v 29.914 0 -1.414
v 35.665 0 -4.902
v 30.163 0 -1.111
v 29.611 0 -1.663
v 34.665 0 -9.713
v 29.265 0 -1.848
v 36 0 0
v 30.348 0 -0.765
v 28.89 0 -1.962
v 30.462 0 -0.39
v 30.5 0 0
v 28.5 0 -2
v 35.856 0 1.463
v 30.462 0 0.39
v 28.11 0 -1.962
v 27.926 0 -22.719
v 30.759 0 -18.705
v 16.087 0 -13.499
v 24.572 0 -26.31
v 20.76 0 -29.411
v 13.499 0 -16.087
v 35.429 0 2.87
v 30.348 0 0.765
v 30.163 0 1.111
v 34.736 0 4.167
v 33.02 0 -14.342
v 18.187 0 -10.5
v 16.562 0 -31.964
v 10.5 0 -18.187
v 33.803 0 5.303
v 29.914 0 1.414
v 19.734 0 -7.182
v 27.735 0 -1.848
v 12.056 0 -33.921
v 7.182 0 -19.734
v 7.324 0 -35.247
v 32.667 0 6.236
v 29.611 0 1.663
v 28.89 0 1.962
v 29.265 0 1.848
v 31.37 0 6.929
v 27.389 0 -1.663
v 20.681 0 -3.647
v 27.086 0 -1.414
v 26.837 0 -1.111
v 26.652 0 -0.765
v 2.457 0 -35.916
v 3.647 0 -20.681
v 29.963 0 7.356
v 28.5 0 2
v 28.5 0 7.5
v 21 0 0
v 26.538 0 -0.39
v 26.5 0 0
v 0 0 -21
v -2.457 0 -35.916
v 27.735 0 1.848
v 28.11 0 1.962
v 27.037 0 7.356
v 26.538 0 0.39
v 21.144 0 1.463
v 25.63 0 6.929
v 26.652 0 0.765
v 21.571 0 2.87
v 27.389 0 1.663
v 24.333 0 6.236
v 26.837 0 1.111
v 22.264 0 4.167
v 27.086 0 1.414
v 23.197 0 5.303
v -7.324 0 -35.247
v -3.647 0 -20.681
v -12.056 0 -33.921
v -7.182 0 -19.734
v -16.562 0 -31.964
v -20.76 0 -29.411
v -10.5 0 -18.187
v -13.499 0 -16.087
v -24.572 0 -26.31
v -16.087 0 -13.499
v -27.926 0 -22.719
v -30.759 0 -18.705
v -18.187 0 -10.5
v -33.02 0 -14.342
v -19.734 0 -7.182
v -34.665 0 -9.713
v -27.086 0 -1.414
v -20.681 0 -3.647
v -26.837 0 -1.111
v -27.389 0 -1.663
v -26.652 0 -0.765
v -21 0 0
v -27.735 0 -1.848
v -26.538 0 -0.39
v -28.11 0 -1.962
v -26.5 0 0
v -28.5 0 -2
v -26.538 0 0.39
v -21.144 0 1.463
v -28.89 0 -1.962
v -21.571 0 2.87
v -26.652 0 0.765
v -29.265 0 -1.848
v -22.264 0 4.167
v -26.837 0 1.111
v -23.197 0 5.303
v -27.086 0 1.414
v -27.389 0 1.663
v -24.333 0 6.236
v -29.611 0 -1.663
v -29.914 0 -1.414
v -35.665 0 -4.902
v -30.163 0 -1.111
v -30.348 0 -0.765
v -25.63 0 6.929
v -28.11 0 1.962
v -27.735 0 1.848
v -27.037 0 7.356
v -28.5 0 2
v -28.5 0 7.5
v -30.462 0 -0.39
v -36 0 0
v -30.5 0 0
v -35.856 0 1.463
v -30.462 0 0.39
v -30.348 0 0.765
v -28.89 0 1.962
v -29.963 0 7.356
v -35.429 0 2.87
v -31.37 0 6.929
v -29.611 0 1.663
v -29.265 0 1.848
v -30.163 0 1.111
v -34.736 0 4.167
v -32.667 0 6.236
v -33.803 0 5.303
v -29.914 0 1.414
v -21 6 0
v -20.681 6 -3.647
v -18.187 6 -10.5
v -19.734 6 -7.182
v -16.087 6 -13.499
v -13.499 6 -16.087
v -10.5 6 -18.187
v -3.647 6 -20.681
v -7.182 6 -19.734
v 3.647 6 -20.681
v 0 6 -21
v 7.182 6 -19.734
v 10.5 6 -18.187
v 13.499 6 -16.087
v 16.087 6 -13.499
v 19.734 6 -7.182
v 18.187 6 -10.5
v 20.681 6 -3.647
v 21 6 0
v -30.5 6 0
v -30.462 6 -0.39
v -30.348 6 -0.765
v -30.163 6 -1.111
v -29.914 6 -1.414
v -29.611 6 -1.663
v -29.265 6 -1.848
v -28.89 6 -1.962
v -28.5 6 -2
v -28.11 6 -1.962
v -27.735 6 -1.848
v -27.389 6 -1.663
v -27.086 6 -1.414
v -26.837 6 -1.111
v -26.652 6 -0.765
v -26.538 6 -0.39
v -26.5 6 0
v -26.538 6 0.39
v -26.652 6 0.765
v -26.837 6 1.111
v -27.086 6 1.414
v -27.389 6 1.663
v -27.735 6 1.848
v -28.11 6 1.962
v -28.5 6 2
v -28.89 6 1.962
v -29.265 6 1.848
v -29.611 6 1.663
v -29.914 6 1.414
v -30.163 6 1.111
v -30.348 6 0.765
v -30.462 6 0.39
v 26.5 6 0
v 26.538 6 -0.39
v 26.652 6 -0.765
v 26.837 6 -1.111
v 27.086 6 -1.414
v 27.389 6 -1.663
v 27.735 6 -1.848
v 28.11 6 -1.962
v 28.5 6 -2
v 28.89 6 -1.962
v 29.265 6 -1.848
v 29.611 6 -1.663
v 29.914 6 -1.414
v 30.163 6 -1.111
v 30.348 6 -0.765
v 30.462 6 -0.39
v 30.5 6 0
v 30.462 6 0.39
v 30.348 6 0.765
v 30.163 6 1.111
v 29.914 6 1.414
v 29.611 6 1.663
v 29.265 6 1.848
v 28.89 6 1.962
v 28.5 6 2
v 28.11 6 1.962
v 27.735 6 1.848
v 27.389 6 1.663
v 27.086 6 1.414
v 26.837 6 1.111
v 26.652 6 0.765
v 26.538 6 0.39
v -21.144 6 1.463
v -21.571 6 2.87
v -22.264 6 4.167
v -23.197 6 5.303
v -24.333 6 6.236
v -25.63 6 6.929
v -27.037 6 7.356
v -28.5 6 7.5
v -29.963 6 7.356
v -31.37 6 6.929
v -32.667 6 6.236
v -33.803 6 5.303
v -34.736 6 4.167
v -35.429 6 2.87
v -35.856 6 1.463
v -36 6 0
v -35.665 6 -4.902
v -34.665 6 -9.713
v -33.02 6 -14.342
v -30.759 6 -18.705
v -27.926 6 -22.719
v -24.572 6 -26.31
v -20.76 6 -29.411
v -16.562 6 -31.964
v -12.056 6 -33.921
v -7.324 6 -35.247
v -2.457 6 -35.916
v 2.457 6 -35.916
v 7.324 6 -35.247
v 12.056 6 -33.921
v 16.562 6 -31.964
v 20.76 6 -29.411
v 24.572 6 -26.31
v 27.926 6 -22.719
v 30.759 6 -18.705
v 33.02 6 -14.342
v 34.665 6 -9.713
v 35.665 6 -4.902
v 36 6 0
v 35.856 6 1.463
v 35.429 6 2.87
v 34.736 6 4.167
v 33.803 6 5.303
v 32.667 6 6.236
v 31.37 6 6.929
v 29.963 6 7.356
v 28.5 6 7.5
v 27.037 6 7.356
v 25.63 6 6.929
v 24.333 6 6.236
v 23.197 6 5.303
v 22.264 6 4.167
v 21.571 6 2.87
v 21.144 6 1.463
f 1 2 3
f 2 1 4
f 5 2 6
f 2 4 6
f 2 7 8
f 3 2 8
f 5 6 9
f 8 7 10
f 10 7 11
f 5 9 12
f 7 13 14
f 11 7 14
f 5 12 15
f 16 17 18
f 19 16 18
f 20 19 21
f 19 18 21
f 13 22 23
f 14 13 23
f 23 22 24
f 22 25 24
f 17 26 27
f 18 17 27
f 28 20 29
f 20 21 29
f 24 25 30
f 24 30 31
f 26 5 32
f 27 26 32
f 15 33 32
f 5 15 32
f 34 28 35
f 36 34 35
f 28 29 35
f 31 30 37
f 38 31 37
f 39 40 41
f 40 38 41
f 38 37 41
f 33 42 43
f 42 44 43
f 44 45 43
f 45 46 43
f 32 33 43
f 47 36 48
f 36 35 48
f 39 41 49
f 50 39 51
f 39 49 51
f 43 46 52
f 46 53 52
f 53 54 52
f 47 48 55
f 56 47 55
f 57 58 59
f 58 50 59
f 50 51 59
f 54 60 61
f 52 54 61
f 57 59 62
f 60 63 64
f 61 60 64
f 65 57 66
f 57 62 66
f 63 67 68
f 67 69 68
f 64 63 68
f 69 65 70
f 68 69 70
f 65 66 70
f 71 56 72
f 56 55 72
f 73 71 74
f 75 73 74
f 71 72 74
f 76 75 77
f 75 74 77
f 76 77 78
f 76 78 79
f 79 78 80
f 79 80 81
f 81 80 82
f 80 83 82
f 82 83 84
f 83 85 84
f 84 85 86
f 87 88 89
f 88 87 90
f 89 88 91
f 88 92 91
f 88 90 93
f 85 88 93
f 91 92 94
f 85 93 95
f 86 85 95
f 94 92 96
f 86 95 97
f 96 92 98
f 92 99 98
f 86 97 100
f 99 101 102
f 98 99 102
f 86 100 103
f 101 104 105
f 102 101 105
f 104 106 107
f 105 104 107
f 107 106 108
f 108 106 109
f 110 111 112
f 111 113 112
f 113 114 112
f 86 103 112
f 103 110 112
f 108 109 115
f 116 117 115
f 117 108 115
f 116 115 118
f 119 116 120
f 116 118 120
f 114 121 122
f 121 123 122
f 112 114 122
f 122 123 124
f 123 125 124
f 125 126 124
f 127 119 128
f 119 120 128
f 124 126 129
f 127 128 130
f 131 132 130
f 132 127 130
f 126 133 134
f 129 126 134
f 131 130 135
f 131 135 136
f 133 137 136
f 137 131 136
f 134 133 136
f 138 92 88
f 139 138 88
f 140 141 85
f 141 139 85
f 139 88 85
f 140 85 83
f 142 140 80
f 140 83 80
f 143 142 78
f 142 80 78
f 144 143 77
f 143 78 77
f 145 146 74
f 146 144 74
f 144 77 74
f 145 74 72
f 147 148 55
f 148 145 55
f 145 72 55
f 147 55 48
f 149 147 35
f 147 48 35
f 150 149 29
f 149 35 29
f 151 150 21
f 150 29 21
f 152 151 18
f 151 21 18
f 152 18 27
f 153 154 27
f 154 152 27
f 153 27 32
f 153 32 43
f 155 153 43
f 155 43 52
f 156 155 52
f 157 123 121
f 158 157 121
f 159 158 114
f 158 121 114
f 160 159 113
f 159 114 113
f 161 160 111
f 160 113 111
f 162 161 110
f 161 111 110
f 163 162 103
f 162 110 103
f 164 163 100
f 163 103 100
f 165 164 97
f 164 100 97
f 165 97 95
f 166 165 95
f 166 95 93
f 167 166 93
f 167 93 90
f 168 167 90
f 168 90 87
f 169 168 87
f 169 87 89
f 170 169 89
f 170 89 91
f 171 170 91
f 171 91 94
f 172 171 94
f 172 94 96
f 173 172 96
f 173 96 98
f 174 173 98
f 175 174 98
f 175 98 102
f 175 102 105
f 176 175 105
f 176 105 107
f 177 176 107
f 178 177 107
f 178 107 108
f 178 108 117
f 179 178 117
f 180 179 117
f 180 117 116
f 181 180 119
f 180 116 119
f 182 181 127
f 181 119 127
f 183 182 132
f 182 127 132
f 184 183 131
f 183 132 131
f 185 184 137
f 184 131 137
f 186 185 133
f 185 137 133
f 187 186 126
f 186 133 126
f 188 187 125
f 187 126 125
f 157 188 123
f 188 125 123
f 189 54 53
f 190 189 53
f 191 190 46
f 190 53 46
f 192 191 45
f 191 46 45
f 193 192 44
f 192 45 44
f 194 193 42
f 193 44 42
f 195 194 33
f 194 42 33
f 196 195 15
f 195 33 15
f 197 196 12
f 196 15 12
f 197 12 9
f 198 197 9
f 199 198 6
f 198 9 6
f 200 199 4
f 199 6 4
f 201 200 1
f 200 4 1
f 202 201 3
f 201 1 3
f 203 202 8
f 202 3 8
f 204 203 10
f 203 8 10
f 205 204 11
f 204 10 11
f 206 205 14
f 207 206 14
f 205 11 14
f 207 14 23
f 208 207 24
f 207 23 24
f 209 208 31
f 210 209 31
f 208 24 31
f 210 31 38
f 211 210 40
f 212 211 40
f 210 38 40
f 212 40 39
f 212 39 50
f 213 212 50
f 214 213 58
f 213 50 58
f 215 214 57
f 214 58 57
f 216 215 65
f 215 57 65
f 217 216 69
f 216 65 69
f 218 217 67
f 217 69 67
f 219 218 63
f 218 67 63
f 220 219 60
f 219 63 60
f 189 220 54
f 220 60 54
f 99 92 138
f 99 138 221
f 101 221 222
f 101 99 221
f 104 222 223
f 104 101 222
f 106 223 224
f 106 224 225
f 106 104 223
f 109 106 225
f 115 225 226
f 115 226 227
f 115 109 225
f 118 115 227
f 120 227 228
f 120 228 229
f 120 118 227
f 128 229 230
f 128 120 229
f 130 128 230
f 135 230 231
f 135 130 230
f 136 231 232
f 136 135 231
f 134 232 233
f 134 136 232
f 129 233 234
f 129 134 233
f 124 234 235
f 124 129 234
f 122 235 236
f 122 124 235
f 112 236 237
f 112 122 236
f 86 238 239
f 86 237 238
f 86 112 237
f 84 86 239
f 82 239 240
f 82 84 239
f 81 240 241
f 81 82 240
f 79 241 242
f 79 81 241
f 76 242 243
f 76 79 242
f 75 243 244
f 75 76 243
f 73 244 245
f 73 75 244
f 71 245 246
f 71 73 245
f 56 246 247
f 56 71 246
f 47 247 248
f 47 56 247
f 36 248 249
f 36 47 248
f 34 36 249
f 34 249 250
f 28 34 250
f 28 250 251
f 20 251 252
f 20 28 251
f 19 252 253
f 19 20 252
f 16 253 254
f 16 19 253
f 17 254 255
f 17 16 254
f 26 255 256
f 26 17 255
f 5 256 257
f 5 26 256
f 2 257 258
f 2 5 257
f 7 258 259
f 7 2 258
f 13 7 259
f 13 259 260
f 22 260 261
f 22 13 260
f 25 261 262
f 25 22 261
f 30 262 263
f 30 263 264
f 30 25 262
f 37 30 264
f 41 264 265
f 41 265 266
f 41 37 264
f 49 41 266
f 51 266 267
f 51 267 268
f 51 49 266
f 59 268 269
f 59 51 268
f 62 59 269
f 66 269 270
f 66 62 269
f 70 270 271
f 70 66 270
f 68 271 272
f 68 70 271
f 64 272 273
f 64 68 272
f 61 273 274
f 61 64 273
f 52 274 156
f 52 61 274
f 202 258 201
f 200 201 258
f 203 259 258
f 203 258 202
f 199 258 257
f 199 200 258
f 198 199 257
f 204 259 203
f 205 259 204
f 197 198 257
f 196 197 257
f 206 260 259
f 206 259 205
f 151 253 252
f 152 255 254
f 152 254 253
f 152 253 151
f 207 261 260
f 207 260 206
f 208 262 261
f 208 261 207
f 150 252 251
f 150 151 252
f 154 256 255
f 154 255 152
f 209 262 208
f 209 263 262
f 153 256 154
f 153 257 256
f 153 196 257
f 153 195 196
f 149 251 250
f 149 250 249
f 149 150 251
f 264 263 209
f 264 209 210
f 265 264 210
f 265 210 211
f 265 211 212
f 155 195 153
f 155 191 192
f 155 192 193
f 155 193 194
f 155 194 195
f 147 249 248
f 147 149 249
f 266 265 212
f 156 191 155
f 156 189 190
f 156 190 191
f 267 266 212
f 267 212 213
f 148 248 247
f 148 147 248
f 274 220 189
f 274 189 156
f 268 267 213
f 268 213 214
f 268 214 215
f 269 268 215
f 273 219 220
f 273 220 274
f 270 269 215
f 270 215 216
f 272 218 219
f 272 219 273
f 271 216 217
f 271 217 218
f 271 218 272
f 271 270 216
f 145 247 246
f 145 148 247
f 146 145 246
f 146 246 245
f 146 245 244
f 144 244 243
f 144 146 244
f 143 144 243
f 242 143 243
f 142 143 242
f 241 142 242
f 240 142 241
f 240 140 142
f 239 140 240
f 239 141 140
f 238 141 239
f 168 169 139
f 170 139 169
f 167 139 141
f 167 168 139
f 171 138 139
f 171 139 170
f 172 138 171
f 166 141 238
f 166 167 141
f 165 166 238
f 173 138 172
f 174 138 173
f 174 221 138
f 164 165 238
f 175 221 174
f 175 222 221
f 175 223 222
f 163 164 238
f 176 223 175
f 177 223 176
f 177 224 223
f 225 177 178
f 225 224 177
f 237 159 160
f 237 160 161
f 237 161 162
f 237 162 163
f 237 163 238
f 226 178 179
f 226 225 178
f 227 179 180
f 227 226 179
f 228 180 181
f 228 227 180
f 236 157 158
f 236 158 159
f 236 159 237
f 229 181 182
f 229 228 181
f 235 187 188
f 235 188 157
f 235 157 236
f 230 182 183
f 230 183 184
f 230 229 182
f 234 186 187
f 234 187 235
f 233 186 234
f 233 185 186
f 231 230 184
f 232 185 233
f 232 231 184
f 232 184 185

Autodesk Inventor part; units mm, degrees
ref_plane "YZ Plane" through (0, 0, 0) normal (1, 0, 0) x (0, 1, 0)
ref_plane "XZ Plane" through (0, 0, 0) normal (0, 1, 0) x (-1, 0, 0)
ref_plane "XY Plane" through (0, 0, 0) normal (0, 0, 1) x (1, 0, 0)
sketch "Sketch1" plane through (0, 0, 0) normal (0, 1, 0) x (-1, 0, 0)
  arc A0 (-21, 0) -> (21, 0) centre (0, 0) ccw
  arc A1 (-36, 0) -> (36, 0) centre (0, 0) ccw
  circle A2 centre (0, 0) radius 28.5
  circle A3 centre (28.5, 0) radius 2
  line L0 (0, 0) -> (36, 0) construction
  circle A4 centre (-28.5, 0) radius 2
  arc A5 (-21, 0) -> (-36, 0) centre (-28.5, 0) ccw
  arc A6 (36, 0) -> (21, 0) centre (28.5, 0) ccw
  dimension "d2" = 57
  dimension "d0" = 42
  dimension "d3" = 15
  dimension "d7" = 360
  dimension "d9" = 4
extrude "Extrusion1" add sketch "Sketch1" along normal blind 6 contours A0 A6 A2 A3 A4 A5 | A2 A4 A3 A6 A1 A5
properties part number "Mount" material "Plywood, Finish"
